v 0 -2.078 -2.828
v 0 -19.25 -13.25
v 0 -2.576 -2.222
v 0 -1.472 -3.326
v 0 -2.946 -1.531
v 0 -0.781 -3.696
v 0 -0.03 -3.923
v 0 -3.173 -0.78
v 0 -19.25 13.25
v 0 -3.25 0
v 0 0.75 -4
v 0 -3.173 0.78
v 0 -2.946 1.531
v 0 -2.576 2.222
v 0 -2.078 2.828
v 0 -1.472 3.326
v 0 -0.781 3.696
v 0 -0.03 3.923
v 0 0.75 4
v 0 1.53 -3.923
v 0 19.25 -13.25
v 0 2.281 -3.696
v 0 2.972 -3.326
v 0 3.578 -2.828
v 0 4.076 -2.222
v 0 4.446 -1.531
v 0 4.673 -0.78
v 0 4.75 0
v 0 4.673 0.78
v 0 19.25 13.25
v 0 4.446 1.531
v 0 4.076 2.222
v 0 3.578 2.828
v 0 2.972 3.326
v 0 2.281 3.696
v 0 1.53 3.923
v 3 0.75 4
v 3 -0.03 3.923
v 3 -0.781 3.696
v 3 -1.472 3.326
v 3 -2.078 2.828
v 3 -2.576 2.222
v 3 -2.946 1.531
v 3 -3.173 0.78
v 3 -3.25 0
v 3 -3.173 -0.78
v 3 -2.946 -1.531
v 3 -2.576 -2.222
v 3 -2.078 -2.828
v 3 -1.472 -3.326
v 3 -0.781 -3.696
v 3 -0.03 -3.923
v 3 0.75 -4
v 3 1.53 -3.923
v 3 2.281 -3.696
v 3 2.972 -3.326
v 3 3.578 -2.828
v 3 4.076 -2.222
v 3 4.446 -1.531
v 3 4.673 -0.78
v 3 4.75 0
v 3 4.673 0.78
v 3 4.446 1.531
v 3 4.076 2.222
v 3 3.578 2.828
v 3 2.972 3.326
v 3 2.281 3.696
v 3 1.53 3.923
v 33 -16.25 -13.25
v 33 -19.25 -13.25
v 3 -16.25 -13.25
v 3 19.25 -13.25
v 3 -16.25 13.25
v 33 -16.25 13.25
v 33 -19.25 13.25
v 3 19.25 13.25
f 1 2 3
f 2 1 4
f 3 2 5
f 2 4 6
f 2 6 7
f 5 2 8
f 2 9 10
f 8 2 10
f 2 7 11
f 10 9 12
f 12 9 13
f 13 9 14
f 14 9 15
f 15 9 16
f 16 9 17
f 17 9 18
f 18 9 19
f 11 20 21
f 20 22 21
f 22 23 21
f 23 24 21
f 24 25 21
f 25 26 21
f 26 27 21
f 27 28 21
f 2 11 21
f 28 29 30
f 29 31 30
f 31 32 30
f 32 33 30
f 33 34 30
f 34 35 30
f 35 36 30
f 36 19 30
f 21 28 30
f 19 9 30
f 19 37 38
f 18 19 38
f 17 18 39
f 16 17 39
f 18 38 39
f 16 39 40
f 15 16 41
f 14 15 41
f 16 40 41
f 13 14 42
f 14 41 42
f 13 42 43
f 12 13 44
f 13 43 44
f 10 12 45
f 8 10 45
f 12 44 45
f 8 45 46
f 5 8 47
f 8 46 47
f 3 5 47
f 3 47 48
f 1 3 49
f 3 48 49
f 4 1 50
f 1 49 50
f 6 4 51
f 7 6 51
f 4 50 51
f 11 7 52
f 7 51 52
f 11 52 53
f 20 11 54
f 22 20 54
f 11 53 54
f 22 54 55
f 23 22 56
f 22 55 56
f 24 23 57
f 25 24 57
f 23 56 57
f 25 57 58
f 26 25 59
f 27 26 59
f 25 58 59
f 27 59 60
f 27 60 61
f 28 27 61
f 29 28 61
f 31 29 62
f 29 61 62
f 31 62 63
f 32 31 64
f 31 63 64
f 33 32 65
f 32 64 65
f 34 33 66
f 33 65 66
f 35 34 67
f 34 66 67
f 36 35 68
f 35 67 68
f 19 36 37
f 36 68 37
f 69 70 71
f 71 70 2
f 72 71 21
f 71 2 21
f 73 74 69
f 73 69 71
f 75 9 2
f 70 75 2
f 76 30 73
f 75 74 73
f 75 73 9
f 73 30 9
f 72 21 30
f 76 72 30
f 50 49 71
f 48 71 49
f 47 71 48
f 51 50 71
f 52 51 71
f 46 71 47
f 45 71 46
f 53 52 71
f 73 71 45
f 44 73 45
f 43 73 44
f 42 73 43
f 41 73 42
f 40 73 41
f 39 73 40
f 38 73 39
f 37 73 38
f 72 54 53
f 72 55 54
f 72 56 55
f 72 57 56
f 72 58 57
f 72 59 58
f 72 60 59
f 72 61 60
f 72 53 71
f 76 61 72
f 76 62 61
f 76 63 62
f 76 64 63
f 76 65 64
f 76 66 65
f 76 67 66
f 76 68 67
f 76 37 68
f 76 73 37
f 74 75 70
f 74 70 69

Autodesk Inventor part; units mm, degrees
ref_plane "YZ Plane" through (0, 0, 0) normal (1, 0, 0) x (0, 1, 0)
ref_plane "XZ Plane" through (0, 0, 0) normal (0, 1, 0) x (-1, 0, 0)
ref_plane "XY Plane" through (0, 0, 0) normal (0, 0, 1) x (1, 0, 0)
sketch "Skizze1" plane through (0, 0, 0) normal (1, 0, 0) x (0, 1, 0)
  line L0 (-19.25, -13.25) -> (19.25, -13.25)
  line L1 (19.25, -13.25) -> (19.25, 13.25)
  line L2 (19.25, 13.25) -> (-19.25, 13.25)
  line L3 (-19.25, 13.25) -> (-19.25, -13.25)
  line L4 (-19.25, -13.25) -> (19.25, 13.25) construction
  line L5 (19.25, -13.25) -> (-19.25, 13.25) construction
  point P0 (0, 0)
  dimension "d0" = 38.5
  dimension "d1" = 26.5
extrude "Extrusion1" add sketch "Skizze1" along normal blind 33
sketch "Skizze2" plane through (0, -19.25, 13.25) normal (0, 0, 1) x (1, 0, 0)
  line L0 (0, 38.5) -> (33, 38.5) projected
  line L1 (3, 38.5) -> (33, 38.5)
  line L2 (33, 38.5) -> (33, 3)
  line L3 (33, 3) -> (3, 3)
  line L4 (3, 3) -> (3, 38.5)
  point P0 (0, 19.25)
  dimension "d4" = 35.5
extrude "Extrusion2" cut sketch "Skizze2" against normal through all
sketch "Skizze3" plane through (0, 0, 0) normal (-1, 0, 0) x (0, 0, 1)
  line L0 (13.25, -16.25) -> (-13.25, -16.25) projected
  point P0 (0, 0)
  point P1 (0, 0.75)
  dimension "d14" = 0
  dimension "d15" = 17
hole "Bohrung1" at (0, 0.75, 0) direction (1, 0, 0) diameter 8 end through all
properties part number "MotorHalterNeu"
